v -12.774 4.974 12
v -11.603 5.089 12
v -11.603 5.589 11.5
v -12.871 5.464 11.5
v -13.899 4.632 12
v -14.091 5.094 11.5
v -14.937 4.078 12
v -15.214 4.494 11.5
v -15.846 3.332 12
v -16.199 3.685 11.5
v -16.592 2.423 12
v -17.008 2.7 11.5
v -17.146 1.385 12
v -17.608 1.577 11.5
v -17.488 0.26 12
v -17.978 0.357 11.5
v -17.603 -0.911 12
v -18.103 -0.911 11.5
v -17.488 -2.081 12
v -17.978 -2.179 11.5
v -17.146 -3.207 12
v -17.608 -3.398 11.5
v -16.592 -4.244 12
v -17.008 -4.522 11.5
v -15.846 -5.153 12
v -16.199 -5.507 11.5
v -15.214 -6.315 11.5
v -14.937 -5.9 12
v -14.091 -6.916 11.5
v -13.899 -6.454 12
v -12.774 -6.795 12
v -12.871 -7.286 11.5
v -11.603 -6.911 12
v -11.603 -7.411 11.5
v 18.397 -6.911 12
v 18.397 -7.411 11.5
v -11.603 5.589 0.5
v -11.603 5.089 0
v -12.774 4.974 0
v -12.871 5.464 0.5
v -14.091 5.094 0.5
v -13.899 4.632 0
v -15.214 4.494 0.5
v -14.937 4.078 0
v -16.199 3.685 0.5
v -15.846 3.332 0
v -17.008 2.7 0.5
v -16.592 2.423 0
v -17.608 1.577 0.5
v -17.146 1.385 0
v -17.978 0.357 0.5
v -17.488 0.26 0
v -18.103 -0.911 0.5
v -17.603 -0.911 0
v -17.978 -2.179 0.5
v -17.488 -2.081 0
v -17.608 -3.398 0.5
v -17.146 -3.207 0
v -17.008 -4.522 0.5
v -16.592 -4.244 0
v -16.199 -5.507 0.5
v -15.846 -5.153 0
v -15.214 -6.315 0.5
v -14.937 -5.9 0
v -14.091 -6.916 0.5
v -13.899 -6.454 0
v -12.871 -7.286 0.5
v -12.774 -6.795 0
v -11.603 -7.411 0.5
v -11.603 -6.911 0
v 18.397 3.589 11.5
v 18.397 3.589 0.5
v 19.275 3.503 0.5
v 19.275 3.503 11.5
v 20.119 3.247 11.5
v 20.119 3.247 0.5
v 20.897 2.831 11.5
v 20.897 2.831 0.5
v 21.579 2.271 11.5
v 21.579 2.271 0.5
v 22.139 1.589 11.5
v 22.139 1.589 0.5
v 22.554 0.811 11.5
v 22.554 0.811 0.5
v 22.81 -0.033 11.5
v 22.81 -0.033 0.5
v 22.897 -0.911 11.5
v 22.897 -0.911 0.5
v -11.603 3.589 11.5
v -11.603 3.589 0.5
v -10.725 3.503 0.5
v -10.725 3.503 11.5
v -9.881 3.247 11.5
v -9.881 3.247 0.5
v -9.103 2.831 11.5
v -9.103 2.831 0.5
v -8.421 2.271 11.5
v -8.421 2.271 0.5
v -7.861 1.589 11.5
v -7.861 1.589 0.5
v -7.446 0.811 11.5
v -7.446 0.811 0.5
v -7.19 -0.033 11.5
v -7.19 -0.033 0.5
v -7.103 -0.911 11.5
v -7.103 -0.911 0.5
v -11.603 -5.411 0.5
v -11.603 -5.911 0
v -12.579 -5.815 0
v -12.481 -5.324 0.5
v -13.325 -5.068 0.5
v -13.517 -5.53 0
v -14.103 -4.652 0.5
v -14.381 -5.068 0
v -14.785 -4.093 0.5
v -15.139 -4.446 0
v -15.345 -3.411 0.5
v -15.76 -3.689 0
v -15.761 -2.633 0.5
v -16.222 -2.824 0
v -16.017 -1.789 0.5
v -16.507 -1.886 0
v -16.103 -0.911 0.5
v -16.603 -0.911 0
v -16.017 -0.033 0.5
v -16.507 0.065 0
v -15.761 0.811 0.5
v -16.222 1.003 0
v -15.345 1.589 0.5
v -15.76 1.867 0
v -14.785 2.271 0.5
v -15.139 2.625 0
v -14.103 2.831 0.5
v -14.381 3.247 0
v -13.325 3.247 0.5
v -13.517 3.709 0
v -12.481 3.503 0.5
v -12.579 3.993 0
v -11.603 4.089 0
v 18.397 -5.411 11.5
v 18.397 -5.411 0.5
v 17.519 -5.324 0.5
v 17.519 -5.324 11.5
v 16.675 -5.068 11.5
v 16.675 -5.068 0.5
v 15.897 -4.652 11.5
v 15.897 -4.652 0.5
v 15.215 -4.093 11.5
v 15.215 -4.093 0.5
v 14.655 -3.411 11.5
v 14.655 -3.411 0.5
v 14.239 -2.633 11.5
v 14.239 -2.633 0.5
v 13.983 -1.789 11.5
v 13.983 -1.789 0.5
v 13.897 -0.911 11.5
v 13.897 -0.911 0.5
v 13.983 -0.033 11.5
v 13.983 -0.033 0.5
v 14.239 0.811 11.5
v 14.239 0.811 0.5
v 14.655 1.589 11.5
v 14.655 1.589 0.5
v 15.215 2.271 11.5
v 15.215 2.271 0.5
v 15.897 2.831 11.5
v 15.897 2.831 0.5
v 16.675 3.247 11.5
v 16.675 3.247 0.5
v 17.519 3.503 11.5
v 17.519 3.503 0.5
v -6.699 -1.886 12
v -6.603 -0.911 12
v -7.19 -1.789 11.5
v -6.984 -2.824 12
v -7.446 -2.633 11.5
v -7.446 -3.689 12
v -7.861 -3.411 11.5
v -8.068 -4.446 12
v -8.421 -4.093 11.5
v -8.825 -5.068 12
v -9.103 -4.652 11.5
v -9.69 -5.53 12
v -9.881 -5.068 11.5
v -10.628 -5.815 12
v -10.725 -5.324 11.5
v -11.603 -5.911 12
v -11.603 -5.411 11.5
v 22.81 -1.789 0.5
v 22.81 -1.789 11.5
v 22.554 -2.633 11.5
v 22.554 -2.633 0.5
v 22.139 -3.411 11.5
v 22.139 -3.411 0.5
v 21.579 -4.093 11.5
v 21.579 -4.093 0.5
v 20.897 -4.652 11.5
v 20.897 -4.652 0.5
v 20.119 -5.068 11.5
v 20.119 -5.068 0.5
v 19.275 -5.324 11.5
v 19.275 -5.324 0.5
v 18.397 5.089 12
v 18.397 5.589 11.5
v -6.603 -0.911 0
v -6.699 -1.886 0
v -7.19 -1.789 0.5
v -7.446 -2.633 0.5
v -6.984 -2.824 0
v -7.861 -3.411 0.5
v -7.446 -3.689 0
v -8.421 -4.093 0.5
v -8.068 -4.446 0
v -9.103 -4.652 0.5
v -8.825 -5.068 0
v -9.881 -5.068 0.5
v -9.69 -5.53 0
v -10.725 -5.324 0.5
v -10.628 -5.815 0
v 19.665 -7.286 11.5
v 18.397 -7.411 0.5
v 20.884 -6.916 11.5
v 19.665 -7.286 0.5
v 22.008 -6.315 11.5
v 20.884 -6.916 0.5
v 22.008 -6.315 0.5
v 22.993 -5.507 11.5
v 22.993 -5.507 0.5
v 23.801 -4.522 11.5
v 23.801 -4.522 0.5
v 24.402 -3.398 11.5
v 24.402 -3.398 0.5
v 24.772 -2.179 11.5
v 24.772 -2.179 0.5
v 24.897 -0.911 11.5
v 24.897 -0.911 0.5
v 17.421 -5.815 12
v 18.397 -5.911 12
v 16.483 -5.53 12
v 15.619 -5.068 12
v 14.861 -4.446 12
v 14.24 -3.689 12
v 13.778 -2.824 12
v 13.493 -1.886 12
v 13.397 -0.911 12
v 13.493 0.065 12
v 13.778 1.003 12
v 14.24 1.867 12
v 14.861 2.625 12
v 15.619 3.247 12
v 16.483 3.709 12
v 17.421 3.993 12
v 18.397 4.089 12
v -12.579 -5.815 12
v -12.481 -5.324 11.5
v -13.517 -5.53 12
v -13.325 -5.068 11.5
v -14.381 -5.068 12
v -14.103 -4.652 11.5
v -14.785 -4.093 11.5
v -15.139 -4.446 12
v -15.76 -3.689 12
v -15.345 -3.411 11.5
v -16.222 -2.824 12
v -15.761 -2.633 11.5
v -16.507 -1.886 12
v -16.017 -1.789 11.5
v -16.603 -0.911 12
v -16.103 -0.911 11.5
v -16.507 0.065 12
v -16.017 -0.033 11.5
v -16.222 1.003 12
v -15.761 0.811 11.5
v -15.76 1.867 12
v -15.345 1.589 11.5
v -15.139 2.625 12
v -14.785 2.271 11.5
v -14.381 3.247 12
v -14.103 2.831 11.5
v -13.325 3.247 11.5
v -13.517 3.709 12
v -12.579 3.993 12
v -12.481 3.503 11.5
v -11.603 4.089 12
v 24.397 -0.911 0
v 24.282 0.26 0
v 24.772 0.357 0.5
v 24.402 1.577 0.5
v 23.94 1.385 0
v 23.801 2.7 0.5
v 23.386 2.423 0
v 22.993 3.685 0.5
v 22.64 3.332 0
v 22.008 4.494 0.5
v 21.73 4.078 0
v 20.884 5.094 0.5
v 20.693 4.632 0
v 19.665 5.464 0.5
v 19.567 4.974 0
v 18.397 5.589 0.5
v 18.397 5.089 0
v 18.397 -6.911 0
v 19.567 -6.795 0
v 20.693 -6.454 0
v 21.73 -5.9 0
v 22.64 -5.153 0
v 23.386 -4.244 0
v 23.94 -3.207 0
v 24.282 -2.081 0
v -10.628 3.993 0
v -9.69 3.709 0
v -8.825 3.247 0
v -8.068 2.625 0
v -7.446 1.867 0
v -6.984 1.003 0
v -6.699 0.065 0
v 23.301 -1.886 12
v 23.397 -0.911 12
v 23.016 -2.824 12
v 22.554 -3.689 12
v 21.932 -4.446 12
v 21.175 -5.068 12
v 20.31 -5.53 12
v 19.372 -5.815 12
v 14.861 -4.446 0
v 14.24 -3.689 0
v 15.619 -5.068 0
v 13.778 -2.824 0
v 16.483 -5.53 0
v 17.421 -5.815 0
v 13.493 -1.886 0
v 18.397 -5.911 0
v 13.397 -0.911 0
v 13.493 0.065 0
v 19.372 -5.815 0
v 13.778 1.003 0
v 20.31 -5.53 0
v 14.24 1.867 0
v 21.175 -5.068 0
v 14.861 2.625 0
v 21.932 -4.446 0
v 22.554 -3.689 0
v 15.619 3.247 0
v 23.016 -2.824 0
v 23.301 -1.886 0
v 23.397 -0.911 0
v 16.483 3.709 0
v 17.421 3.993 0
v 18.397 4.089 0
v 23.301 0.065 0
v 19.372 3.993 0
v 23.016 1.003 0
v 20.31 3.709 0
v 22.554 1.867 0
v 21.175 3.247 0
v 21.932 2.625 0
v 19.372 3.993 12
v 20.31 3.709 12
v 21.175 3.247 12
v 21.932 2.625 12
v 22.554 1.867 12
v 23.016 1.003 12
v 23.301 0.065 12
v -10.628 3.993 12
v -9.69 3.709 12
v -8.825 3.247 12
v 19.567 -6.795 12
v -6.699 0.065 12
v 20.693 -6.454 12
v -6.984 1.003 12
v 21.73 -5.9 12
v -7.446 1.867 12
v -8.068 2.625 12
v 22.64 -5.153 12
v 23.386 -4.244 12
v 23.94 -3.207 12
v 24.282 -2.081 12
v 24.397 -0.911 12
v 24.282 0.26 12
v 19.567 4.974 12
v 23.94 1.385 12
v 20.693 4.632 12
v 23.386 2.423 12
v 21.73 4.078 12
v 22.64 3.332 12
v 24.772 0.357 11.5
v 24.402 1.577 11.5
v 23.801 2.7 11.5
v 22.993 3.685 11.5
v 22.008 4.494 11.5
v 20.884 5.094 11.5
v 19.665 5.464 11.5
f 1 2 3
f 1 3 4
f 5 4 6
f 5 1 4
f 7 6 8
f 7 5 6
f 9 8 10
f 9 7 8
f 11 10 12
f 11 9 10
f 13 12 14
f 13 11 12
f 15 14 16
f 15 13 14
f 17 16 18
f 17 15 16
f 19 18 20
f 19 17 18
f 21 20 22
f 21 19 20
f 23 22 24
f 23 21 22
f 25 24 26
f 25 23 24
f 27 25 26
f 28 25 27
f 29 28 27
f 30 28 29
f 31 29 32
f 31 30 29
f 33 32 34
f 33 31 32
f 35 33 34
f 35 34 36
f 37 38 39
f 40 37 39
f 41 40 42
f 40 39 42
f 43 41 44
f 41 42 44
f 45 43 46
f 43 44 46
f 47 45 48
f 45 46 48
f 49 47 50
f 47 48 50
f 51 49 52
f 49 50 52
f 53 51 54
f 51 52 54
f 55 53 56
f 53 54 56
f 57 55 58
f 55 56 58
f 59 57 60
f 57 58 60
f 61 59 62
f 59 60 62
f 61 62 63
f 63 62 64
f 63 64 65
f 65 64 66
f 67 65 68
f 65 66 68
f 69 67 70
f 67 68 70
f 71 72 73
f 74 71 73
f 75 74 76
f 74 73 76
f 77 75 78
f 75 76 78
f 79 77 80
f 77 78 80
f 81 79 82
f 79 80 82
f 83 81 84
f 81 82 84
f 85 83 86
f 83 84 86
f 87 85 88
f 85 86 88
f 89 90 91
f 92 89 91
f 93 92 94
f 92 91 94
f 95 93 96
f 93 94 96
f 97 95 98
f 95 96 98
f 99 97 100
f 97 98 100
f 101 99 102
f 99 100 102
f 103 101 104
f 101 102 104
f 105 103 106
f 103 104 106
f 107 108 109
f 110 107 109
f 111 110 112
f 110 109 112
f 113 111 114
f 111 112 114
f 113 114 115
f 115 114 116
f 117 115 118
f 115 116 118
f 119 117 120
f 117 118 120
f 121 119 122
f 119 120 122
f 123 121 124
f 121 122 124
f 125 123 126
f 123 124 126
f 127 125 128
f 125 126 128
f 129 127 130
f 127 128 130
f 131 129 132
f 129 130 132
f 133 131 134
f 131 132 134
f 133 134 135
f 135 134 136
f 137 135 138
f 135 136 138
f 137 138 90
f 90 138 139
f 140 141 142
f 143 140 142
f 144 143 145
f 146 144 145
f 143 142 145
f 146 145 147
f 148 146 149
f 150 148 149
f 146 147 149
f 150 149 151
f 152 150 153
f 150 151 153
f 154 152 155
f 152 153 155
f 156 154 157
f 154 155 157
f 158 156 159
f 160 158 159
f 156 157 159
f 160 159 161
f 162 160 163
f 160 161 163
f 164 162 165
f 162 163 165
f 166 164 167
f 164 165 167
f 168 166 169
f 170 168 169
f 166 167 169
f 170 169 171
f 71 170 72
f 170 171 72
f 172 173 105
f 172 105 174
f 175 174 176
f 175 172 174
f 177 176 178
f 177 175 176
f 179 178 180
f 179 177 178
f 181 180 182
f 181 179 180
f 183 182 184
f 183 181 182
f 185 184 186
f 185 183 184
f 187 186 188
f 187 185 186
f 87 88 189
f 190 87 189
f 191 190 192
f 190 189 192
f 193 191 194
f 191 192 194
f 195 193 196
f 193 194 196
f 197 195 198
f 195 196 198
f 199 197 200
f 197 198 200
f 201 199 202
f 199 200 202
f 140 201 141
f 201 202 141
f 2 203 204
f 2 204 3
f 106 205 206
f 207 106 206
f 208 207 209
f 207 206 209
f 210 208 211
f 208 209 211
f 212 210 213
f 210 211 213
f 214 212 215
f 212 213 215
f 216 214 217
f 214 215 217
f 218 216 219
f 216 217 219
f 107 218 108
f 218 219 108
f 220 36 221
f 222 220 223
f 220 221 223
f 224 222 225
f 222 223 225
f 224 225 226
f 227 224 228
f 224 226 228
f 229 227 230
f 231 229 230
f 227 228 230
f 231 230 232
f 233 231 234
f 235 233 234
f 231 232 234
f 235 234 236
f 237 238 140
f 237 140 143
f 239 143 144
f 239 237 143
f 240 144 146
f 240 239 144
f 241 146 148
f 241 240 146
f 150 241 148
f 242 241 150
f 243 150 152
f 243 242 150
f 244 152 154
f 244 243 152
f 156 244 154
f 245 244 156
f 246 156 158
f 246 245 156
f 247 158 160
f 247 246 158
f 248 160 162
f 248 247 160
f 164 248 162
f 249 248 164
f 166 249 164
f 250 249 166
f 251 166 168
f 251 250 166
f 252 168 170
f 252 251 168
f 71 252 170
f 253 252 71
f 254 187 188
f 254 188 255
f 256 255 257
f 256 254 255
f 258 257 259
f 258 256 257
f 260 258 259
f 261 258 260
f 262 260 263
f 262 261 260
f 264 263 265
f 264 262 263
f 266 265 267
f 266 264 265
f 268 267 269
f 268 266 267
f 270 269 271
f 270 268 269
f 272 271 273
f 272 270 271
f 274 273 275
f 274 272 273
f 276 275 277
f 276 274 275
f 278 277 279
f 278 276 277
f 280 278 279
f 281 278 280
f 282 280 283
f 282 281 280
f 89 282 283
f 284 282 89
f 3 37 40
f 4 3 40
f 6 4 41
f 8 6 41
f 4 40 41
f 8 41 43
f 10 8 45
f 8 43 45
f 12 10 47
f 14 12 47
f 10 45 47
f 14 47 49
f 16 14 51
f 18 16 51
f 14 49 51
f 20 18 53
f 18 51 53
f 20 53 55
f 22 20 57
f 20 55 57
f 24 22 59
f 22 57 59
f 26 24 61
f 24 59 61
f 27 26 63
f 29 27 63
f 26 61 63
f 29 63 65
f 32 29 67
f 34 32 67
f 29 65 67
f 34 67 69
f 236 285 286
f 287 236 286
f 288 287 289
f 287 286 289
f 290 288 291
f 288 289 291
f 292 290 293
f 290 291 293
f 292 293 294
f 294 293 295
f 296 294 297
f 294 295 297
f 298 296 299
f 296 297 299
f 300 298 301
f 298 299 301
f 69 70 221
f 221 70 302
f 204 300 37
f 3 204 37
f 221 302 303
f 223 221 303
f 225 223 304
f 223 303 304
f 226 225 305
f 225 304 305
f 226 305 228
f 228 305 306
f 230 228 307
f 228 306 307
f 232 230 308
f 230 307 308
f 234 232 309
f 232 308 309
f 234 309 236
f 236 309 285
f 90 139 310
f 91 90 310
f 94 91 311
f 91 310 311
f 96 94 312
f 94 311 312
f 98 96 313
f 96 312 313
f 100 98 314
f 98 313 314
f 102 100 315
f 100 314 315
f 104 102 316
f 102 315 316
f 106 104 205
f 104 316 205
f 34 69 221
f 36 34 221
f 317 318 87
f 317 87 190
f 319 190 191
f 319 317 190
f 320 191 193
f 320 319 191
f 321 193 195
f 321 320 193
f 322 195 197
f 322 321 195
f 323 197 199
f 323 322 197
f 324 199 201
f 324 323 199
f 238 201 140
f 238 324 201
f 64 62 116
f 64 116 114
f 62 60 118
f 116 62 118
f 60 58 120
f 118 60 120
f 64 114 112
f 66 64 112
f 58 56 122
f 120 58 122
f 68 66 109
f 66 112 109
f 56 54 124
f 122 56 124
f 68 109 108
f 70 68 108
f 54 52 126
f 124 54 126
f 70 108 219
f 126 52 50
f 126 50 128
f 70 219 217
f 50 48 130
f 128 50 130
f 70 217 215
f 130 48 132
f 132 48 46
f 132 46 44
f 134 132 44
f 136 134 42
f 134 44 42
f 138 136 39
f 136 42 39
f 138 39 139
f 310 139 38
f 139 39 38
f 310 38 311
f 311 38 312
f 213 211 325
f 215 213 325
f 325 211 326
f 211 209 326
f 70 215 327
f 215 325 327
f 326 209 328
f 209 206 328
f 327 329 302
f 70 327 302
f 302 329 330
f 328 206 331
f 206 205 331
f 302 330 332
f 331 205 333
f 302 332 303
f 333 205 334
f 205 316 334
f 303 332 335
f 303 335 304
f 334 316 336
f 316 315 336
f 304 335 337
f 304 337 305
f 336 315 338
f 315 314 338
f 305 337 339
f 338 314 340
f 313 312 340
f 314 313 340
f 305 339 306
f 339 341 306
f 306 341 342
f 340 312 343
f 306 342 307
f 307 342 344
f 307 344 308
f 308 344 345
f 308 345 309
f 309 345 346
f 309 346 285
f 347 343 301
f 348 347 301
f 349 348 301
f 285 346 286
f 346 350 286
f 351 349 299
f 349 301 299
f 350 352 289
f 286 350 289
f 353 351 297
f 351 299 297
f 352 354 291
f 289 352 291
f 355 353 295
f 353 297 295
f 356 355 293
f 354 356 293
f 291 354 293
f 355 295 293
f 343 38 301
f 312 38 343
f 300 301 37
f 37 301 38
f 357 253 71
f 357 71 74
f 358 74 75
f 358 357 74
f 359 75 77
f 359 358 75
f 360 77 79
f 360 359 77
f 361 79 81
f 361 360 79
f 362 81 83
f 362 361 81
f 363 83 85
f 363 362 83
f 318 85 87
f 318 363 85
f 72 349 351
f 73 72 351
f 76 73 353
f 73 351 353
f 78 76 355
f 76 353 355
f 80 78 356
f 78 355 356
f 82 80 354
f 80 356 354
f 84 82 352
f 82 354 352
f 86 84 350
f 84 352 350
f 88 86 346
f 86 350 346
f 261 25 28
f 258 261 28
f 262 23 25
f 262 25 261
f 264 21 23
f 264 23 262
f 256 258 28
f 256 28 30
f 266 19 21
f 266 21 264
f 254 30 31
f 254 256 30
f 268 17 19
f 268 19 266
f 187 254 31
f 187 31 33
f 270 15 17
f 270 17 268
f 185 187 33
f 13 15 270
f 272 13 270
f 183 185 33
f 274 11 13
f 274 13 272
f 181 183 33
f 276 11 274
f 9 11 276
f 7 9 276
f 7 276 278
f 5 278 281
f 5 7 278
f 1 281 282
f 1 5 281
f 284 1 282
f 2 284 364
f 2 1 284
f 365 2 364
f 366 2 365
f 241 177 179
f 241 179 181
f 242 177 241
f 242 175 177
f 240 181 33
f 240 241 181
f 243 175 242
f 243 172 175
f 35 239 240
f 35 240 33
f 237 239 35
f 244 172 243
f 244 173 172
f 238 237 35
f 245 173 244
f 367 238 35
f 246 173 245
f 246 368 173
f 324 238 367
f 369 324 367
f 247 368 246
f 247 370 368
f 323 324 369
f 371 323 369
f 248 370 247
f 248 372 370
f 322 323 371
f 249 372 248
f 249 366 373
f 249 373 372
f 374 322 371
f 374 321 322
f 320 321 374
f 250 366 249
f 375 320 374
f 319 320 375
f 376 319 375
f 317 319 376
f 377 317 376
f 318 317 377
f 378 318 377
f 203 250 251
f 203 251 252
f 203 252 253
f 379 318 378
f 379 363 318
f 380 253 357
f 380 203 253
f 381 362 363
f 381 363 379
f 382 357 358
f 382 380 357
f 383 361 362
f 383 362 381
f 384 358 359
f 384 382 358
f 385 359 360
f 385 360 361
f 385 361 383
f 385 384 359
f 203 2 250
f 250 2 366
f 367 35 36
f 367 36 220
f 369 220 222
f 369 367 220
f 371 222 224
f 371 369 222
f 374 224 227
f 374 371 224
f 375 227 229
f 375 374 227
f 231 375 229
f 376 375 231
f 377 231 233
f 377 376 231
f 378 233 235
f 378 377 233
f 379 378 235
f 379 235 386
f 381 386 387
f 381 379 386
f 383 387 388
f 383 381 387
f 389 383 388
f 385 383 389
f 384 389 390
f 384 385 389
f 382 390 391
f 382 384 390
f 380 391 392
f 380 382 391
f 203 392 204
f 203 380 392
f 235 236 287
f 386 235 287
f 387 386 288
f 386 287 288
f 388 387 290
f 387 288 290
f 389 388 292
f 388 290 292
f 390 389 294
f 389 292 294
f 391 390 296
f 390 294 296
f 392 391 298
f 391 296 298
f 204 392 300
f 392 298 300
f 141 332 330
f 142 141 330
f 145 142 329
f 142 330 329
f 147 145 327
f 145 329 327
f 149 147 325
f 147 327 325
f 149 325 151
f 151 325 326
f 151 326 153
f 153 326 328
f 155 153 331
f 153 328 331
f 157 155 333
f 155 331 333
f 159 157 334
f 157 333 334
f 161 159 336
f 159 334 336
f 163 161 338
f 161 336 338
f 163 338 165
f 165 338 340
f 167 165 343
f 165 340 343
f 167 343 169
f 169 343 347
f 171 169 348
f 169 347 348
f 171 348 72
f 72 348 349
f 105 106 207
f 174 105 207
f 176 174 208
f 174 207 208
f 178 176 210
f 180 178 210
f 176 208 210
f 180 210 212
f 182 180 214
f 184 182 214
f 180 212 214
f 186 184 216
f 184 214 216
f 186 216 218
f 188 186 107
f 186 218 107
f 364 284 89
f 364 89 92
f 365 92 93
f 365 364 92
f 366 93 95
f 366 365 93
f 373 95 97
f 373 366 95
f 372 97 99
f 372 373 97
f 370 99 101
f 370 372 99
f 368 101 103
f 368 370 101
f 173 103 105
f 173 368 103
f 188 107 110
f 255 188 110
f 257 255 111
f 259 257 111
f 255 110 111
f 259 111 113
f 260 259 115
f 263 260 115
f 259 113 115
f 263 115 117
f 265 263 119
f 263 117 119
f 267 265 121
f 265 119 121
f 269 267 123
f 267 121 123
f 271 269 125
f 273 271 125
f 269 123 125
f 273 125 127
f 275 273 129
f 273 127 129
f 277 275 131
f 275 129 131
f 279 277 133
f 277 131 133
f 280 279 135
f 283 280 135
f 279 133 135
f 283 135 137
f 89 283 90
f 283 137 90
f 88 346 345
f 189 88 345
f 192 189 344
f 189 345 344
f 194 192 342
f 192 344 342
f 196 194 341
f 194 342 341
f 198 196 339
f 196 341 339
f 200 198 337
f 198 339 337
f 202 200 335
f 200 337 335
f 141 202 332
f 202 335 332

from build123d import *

# Parameters (mm, degrees)
F1_DEPTH = 12
F2_SIZE  = 0.5


with BuildPart() as f1:
    # F0 (on Top) → F1 (new body)
    with BuildSketch(Plane.XY):
        with BuildLine():
            Line((-11.60309311, 3.5892210044), (-11.60309311, 5.5892210044))
            ThreePointArc((-11.60309311, 5.5892210044), (-18.10309311, -0.9107789956), (-11.60309311, -7.4107789956))
            Line((-11.60309311, -7.4107789956), (-11.60309311, -5.4107789956))
            ThreePointArc((-11.60309311, -5.4107789956), (-16.10309311, -0.9107789956), (-11.60309311, 3.5892210044))
        make_face()
        with BuildLine():
            ThreePointArc((-5.10309311, -0.9107789956), (-7.0068990323, 3.6854150821), (-11.60309311, 5.5892210044))
            Line((-11.60309311, 5.5892210044), (-11.60309311, 3.5892210044))
            ThreePointArc((-11.60309311, 3.5892210044), (-8.4211125947, 2.2712015197), (-7.10309311, -0.9107789956))
            ThreePointArc((-7.10309311, -0.9107789956), (-8.4211125947, -4.0927595109), (-11.60309311, -5.4107789956))
            Line((-11.60309311, -5.4107789956), (-6.9126773502, -5.4107789956))
            ThreePointArc((-6.9126773502, -5.4107789956), (-5.572433841, -3.3358869892), (-5.10309311, -0.9107789956))
        make_face()
        with BuildLine():
            Line((18.39690689, 5.5892210044), (-11.60309311, 5.5892210044))
            ThreePointArc((-11.60309311, 5.5892210044), (-7.0068990323, 3.6854150821), (-5.10309311, -0.9107789956))
            ThreePointArc((-5.10309311, -0.9107789956), (-5.572433841, -3.3358869892), (-6.9126773502, -5.4107789956))
            Line((-6.9126773502, -5.4107789956), (13.7064911302, -5.4107789956))
            ThreePointArc((13.7064911302, -5.4107789956), (12.4177765184, 1.6387307612), (18.39690689, 5.5892210044))
        make_face()
        with BuildLine():
            Line((18.39690689, 3.5892210044), (18.39690689, 5.5892210044))
            ThreePointArc((18.39690689, 5.5892210044), (12.4177765184, 1.6387307612), (13.7064911302, -5.4107789956))
            Line((13.7064911302, -5.4107789956), (18.39690689, -5.4107789956))
            ThreePointArc((18.39690689, -5.4107789956), (13.89690689, -0.9107789956), (18.39690689, 3.5892210044))
        make_face()
        with BuildLine():
            ThreePointArc((24.89690689, -0.9107789956), (22.9931009677, 3.6854150821), (18.39690689, 5.5892210044))
            Line((18.39690689, 5.5892210044), (18.39690689, 3.5892210044))
            ThreePointArc((18.39690689, 3.5892210044), (21.5788874053, 2.2712015197), (22.89690689, -0.9107789956))
            ThreePointArc((22.89690689, -0.9107789956), (21.5788874053, -4.0927595109), (18.39690689, -5.4107789956))
            Line((18.39690689, -5.4107789956), (18.39690689, -7.4107789956))
            ThreePointArc((18.39690689, -7.4107789956), (22.9931009677, -5.5069730733), (24.89690689, -0.9107789956))
        make_face()
        with BuildLine():
            Line((18.39690689, -5.4107789956), (13.7064911302, -5.4107789956))
            ThreePointArc((13.7064911302, -5.4107789956), (15.8473971332, -6.8899093672), (18.39690689, -7.4107789956))
            Line((18.39690689, -7.4107789956), (18.39690689, -5.4107789956))
        make_face()
        with BuildLine():
            ThreePointArc((-6.9126773502, -5.4107789956), (-9.0535833532, -6.8899093672), (-11.60309311, -7.4107789956))
            Line((-11.60309311, -7.4107789956), (18.39690689, -7.4107789956))
            ThreePointArc((18.39690689, -7.4107789956), (15.8473971332, -6.8899093672), (13.7064911302, -5.4107789956))
            Line((13.7064911302, -5.4107789956), (-6.9126773502, -5.4107789956))
        make_face()
        with BuildLine():
            Line((-11.60309311, -5.4107789956), (-11.60309311, -7.4107789956))
            ThreePointArc((-11.60309311, -7.4107789956), (-9.0535833532, -6.8899093672), (-6.9126773502, -5.4107789956))
            Line((-6.9126773502, -5.4107789956), (-11.60309311, -5.4107789956))
        make_face()
    extrude(amount=F1_DEPTH)

    # F2
    f2_edges = [f1.edges().sort_by_distance(p)[0] for p in [
        (-18.103093, -0.910779, 12),
        (3.396907, -7.410779, 12),
        (24.896907, -0.910779, 12),
        (3.396907, 5.589221, 12),
        (-11.603093, 3.589221, 12),
        (18.396907, 3.589221, 12),
        (-18.103093, -0.910779, 0),
        (3.396907, -7.410779, 0),
        (24.896907, -0.910779, 0),
        (3.396907, 5.589221, 0),
        (-11.603093, 3.589221, 0),
        (18.396907, 3.589221, 0),
    ]]
    chamfer(f2_edges, length=F2_SIZE)


with BuildPart() as f3_1:
    # F3: copy of F1
    add(f1.part.moved(Location((0, -24.4623, 0))))


solid = f1.part
